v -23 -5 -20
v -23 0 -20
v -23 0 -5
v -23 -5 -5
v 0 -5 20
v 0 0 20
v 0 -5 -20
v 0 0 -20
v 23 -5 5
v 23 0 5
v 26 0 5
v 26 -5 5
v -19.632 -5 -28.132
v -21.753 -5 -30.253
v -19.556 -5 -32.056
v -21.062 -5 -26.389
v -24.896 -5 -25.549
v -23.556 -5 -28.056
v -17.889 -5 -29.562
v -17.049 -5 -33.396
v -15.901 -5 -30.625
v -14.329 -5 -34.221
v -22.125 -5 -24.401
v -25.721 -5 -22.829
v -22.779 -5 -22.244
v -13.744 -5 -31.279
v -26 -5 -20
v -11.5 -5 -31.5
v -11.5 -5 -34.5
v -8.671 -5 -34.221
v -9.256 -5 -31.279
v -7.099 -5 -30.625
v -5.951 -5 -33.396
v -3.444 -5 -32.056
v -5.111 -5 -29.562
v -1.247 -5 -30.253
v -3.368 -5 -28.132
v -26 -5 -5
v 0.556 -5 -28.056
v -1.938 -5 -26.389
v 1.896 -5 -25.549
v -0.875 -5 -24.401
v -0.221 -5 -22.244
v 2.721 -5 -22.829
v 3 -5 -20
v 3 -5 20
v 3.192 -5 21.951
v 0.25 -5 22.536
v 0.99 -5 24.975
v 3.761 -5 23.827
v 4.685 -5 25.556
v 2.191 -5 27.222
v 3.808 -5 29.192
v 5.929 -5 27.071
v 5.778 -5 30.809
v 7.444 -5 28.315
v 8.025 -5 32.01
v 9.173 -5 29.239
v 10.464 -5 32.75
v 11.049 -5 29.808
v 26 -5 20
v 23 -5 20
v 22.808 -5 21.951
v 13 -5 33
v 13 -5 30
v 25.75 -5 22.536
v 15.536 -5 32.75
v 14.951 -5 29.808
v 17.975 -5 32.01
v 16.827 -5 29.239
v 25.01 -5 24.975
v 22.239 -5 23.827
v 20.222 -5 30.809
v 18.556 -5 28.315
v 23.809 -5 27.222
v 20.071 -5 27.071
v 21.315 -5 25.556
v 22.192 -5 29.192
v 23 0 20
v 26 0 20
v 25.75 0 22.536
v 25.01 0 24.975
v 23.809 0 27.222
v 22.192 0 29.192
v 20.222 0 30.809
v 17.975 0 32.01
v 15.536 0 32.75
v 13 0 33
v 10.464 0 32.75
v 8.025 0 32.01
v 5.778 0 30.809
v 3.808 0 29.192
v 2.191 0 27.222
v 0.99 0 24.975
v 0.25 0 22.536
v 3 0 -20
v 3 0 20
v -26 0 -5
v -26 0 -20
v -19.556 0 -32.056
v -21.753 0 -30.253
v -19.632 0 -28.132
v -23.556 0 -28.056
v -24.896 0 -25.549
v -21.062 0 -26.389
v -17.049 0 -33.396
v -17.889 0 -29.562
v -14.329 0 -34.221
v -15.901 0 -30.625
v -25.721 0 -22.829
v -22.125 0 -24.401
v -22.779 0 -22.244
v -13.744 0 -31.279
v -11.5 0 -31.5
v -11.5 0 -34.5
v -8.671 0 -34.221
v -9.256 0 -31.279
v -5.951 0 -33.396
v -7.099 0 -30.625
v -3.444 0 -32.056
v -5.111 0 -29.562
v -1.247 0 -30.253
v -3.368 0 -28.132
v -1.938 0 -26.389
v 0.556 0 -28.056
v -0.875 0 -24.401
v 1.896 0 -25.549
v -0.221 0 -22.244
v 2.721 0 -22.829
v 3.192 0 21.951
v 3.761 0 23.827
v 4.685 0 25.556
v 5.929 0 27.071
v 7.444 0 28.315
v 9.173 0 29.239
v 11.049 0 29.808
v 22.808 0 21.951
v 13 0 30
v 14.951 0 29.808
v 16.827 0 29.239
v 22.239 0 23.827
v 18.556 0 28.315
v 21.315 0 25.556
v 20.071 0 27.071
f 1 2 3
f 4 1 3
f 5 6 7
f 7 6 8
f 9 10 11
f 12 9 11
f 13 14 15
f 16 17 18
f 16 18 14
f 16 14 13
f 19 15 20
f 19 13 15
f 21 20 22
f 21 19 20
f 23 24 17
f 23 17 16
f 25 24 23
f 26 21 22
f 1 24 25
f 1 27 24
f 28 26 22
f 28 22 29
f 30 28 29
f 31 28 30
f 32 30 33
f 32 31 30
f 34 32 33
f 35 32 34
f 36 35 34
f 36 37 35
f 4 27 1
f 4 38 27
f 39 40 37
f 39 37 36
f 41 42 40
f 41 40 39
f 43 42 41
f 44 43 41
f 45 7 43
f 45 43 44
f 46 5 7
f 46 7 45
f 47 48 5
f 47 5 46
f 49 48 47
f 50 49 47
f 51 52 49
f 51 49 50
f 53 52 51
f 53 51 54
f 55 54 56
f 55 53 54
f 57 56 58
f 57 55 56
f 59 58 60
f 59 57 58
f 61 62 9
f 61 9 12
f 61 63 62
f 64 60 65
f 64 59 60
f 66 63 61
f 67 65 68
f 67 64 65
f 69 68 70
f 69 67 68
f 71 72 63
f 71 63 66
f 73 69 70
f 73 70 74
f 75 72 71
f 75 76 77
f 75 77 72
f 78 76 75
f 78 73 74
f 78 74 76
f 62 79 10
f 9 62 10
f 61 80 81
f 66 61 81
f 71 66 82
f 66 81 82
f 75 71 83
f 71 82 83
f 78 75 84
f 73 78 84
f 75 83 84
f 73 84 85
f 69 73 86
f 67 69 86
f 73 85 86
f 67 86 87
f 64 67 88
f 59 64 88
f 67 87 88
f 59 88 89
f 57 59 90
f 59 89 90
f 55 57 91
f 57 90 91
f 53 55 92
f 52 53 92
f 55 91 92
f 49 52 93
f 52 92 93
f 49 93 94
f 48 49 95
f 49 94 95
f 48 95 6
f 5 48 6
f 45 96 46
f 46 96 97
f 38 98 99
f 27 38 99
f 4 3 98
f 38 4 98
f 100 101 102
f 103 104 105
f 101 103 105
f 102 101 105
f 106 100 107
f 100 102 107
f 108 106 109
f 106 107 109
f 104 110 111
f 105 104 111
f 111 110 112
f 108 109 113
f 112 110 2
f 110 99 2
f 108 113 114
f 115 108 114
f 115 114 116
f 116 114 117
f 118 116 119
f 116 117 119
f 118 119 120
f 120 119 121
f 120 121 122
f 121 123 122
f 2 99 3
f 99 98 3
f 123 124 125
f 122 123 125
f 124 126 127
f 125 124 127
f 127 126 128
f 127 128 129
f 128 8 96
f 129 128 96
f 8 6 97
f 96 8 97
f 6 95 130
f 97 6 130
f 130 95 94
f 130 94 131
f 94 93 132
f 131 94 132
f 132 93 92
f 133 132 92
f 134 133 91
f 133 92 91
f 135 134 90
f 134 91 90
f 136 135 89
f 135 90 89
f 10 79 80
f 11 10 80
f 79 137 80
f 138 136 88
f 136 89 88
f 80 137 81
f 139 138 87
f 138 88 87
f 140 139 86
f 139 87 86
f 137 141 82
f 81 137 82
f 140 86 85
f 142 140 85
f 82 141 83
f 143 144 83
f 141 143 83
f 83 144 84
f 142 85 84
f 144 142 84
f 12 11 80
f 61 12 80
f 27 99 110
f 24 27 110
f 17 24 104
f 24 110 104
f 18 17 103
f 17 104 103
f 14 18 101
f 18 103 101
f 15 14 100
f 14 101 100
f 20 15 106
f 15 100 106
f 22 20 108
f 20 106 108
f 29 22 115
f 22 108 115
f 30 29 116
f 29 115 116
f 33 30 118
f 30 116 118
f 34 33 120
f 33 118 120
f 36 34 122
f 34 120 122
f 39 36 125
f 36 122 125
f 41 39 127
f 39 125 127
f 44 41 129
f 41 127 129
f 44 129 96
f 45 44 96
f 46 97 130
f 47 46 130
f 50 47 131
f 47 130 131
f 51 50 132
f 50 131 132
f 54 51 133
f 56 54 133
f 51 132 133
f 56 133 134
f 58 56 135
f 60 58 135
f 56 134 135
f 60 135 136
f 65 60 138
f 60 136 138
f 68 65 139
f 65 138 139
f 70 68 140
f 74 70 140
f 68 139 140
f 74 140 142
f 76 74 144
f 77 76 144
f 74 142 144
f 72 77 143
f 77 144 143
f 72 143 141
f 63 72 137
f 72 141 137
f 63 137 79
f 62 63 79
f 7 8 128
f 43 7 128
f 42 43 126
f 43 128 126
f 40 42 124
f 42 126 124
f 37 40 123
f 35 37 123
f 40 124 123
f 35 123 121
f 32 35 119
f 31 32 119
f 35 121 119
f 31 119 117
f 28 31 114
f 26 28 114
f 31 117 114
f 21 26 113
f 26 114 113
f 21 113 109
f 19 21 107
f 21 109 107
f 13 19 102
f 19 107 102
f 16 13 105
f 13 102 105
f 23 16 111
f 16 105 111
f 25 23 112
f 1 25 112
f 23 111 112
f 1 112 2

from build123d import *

# Parameters (mm, degrees)
F2_DEPTH = 5


with BuildPart() as f2:
    # F0 (on Front) → F2 (new body)
    with BuildSketch(Plane.XZ):
        with BuildLine():
            Line((23, 20), (23, 5))
            Line((23, 5), (26, 5))
            Line((26, 5), (26, 20))
            ThreePointArc((26, 20), (13, 33), (0, 20))
            Line((0, 20), (0, 0))
            Line((0, 0), (3, 0))
            Line((3, 0), (3, 20))
            ThreePointArc((3, 20), (13, 30), (23, 20))
        make_face()
        with BuildLine():
            Line((3, -20), (3, 0))
            Line((3, 0), (0, 0))
            Line((0, 0), (0, -20))
            ThreePointArc((0, -20), (-11.5, -31.5), (-23, -20))
            Line((-23, -20), (-23, -5))
            Line((-23, -5), (-26, -5))
            Line((-26, -5), (-26, -20))
            ThreePointArc((-26, -20), (-11.5, -34.5), (3, -20))
        make_face()
    extrude(amount=F2_DEPTH)


solid = f2.part
